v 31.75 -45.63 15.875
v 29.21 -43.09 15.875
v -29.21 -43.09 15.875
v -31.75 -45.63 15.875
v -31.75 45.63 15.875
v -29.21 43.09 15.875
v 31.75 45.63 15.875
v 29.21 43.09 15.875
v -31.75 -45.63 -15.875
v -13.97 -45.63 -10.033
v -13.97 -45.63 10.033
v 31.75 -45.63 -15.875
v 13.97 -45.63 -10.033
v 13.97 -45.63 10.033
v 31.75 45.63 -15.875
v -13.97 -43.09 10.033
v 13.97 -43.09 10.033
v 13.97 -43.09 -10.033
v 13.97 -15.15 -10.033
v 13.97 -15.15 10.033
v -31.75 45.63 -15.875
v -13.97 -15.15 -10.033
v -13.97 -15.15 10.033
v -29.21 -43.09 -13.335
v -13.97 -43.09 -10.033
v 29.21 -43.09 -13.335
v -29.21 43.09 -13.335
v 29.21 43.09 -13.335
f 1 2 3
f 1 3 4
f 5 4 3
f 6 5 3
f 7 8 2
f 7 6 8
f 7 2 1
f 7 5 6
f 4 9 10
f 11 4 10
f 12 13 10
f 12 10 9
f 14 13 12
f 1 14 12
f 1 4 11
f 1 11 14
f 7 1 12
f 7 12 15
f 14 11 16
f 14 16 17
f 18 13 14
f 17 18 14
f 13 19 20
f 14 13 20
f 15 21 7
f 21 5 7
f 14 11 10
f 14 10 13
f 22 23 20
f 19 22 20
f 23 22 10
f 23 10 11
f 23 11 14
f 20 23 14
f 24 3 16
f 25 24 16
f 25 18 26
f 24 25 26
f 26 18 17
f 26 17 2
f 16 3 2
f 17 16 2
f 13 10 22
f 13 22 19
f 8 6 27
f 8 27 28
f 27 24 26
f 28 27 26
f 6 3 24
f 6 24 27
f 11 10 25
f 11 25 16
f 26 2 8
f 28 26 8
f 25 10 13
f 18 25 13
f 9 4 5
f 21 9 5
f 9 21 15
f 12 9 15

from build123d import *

# Parameters (mm, degrees)
F0_W     = 63.5
F0_H     = 91.259566
F1_DEPTH = 15.875
F2_T     = -2.54
F3_W     = 27.94
F3_H     = 20.066
F4_DEPTH = 6.35
F5_W     = 27.94
F5_H     = 20.066
F6_DEPTH = 30.48


with BuildPart() as f1:
    # F0 (on Top) → F1 (new body, symmetric)
    with BuildSketch(Plane.XY):
        Rectangle(F0_W, F0_H)
    extrude(amount=F1_DEPTH, both=True)

    # F2
    f2_openings = [f1.faces().sort_by_distance(p)[0] for p in [
        (0, 0, 15.875),
    ]]
    offset(amount=F2_T, openings=f2_openings)

    # F3 (on face) → F4 (cut)
    with BuildSketch(Plane.XZ.offset(45.629783)):
        Rectangle(F3_W, F3_H)
    extrude(amount=-F4_DEPTH, mode=Mode.SUBTRACT)


with BuildPart() as f6:
    # F5 (on face) → F6 (new body)
    with BuildSketch(Plane.XZ.offset(45.629783)):
        Rectangle(F5_W, F5_H)
    extrude(amount=-F6_DEPTH)


solid = Compound([f1.part, f6.part])
